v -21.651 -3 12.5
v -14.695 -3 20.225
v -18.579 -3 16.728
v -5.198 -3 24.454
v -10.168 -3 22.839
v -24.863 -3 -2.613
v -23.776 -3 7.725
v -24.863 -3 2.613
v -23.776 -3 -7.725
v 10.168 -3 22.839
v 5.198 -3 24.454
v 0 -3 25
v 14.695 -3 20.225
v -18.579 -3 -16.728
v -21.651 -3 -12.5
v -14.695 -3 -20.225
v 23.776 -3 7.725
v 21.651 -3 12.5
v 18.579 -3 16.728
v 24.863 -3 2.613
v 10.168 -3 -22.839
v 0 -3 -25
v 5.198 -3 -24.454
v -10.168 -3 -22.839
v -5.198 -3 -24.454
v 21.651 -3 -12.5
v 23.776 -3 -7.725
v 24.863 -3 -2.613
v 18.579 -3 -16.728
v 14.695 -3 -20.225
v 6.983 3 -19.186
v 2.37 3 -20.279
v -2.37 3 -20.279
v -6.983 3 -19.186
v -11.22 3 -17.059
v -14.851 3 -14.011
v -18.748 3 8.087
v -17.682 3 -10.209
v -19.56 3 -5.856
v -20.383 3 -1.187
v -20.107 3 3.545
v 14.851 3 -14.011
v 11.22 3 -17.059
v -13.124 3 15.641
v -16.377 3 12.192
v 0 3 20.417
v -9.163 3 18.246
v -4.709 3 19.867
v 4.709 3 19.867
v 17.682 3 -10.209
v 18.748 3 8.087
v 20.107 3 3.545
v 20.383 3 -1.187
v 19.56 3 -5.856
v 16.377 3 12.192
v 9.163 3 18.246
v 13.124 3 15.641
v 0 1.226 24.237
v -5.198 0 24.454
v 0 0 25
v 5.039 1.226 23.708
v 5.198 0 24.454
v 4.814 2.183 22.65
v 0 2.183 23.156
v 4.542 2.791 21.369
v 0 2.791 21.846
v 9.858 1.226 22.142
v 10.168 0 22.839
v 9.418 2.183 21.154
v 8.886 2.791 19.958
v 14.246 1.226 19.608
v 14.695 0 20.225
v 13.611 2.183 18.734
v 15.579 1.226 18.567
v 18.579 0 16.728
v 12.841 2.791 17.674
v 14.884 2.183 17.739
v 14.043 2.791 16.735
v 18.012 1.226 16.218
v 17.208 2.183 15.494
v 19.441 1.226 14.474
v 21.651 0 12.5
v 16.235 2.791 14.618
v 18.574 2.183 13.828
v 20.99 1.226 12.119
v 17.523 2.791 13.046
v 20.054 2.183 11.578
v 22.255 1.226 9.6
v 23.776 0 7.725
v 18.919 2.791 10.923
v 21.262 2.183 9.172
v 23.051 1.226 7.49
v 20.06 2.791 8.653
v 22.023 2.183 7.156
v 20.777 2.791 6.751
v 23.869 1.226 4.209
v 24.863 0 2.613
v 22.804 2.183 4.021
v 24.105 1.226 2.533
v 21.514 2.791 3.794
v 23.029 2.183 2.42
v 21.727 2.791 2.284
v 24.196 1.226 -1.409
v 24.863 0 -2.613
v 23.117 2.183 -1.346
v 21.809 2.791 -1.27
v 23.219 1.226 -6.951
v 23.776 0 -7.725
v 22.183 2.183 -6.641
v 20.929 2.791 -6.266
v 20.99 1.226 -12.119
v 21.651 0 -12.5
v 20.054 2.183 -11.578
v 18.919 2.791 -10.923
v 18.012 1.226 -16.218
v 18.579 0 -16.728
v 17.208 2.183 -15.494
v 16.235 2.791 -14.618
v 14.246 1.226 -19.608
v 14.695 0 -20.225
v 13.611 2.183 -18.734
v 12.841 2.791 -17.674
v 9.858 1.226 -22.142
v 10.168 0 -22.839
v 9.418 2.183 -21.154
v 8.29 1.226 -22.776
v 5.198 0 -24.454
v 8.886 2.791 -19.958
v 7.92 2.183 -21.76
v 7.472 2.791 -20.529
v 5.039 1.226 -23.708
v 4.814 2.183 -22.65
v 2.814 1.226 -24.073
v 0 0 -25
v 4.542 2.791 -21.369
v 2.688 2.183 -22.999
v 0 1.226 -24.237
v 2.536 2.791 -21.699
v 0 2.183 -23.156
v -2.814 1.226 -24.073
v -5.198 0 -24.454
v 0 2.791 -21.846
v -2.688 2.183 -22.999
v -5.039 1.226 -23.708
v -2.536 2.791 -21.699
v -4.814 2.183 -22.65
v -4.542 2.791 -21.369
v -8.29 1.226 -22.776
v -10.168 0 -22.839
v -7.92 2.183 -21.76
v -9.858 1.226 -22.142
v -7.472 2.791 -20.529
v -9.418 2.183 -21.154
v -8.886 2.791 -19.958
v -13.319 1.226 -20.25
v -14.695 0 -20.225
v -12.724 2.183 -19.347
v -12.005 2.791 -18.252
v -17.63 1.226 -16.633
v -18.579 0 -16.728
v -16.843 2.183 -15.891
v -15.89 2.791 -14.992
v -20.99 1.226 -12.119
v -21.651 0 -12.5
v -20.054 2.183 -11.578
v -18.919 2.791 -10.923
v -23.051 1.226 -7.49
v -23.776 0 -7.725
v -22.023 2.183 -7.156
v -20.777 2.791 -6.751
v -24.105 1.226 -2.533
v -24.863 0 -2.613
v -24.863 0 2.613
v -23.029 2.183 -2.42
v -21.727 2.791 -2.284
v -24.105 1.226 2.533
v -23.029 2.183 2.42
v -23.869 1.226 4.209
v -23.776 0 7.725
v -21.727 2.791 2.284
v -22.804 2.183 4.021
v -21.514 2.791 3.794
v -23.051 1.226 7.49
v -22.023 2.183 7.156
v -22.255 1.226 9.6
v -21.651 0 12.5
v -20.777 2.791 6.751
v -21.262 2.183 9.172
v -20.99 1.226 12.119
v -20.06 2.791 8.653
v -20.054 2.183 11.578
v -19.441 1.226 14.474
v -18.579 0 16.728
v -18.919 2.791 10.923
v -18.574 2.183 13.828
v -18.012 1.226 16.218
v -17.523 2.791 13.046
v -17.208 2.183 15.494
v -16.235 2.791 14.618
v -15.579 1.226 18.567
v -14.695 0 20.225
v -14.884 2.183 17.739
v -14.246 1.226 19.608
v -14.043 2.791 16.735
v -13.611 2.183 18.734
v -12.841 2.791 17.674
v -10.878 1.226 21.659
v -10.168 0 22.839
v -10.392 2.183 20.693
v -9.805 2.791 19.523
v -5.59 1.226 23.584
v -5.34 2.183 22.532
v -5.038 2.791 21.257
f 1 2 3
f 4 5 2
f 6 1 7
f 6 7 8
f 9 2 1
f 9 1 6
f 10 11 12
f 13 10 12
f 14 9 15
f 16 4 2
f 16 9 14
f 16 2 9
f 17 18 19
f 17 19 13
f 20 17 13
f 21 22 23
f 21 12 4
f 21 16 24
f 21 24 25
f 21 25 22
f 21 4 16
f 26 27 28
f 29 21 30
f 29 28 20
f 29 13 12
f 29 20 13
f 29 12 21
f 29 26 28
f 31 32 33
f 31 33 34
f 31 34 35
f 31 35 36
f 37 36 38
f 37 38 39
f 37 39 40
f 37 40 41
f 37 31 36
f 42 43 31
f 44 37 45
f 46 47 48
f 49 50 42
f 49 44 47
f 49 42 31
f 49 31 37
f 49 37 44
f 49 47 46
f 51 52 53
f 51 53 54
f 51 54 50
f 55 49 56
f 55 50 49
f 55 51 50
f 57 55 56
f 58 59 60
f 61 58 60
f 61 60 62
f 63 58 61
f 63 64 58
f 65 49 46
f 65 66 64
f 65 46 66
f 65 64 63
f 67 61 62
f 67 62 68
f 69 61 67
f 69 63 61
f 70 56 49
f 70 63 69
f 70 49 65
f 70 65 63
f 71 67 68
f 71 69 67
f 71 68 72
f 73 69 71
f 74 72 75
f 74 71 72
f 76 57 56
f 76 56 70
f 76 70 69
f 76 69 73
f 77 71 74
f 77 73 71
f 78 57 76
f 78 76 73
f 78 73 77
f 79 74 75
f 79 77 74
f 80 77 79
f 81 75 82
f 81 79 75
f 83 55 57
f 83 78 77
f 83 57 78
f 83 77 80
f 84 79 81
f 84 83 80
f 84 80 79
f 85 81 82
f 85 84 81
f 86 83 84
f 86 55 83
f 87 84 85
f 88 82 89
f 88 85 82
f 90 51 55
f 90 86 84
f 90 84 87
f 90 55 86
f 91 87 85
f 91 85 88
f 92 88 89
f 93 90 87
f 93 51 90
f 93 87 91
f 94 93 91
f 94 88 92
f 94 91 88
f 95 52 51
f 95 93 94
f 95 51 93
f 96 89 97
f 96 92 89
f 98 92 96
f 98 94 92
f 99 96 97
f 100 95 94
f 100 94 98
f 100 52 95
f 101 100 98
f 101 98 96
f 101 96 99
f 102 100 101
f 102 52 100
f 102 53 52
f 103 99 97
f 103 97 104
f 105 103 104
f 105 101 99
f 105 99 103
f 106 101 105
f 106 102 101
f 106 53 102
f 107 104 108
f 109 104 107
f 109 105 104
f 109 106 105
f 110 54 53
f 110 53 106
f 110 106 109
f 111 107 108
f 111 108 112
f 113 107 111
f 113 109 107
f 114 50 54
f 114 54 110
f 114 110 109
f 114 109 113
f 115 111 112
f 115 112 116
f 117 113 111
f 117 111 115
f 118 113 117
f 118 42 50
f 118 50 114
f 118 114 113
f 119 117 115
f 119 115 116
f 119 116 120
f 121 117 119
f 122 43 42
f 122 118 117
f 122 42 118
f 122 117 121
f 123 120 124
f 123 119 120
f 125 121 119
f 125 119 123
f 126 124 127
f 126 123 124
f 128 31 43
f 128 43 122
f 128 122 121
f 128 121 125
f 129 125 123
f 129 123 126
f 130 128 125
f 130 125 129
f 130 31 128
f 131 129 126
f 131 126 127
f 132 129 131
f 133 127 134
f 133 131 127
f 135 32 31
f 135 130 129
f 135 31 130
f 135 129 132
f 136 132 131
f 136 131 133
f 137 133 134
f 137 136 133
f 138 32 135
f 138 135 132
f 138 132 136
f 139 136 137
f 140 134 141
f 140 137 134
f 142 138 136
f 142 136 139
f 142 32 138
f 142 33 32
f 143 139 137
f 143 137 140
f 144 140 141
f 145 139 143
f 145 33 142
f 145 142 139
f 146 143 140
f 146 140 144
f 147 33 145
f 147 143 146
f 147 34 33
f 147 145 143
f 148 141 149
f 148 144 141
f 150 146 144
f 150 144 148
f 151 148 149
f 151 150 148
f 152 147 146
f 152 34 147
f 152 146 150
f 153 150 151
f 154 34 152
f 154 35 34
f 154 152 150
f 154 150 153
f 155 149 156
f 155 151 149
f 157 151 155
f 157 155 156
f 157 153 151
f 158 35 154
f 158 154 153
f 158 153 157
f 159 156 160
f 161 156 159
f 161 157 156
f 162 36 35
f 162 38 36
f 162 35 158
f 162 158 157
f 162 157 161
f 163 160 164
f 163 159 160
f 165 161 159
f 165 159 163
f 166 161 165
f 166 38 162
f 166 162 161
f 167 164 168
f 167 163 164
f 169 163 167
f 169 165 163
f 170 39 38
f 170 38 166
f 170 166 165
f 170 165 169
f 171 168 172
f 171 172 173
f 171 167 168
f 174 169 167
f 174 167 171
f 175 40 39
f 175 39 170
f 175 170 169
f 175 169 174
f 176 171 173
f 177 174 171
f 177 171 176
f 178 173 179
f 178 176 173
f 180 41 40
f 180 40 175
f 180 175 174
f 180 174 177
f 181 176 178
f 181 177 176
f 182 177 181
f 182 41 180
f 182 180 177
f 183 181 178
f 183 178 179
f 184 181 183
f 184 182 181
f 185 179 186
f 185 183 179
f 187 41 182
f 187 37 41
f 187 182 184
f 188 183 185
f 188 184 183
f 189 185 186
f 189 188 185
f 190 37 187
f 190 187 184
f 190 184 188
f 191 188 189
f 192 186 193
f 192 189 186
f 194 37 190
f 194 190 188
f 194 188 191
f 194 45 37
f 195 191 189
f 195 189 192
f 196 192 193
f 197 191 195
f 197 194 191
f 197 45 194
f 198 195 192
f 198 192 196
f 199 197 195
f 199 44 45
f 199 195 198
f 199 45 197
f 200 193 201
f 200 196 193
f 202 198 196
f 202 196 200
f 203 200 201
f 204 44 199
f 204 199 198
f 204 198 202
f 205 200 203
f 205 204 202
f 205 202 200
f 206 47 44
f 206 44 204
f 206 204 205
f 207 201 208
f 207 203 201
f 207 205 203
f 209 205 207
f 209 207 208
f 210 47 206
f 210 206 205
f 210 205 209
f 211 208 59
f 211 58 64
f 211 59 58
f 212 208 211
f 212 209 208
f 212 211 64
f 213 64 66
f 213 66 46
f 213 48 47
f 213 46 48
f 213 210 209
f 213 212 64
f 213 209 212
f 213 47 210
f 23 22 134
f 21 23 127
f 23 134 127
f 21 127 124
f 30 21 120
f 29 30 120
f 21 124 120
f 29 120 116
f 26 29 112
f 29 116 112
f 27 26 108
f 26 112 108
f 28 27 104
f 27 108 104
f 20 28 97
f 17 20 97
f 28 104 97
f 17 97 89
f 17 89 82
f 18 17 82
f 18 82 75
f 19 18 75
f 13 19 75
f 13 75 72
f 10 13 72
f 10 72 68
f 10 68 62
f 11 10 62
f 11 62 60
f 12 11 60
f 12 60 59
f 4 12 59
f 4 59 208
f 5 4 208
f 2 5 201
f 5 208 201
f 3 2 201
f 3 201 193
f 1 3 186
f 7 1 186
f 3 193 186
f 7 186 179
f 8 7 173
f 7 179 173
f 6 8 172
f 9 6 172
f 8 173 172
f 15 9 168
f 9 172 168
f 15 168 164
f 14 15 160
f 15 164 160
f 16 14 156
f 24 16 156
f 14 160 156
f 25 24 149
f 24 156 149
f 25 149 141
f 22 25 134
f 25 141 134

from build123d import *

# Parameters (mm, degrees)
SKETCH1_R           = 25
BOSS_EXTRUDE1_DEPTH = 3
FILLET1_R           = 5
SKETCH9_R           = 25
BOSS_EXTRUDE2_DEPTH = 3


with BuildPart() as part:
    # Sketch1 → Boss-Extrude1 (new body)
    with BuildSketch(Plane(origin=(0, 0, 0), x_dir=(1, 0, 0), z_dir=(0, 1, 0))):
        with Locations(Location((0, 0, 0), (0, 0, 270))):
            Circle(SKETCH1_R)
    extrude(amount=BOSS_EXTRUDE1_DEPTH)

    # Fillet1
    # the kernel refuses this fillet: 5 mm, written as the material it takes off along each edge
    with BuildSketch(Plane(origin=(0, 3, 0), x_dir=(0, 0, 1), z_dir=(-1, 0, 0))) as fillet1_piece_1:
        with BuildLine():
            CenterArc((20.417424305, -5), FILLET1_R, 23.578178478, 66.421821522)
            Line((20.417424305, 0), (20.417424305, 0.1))
            Line((20.417424305, 0.1), (25, 0.1))
            Line((25, 0.1), (25.1, 0))
            ThreePointArc((25.1, 0), (25.1, -1.5), (25.091651514, -2.96))
            Line((25.091651514, -2.96), (25, -3))
        make_face()
    revolve(axis=Axis((0, 3, 0), (0, 1, 0)), mode=Mode.SUBTRACT)

    # Sketch9 → Boss-Extrude2 (add)
    with BuildSketch(Plane.XZ):
        with Locations(Location((0, 0, 0), (0, 0, 270))):
            Circle(SKETCH9_R)
    extrude(amount=BOSS_EXTRUDE2_DEPTH)


solid = part.part
